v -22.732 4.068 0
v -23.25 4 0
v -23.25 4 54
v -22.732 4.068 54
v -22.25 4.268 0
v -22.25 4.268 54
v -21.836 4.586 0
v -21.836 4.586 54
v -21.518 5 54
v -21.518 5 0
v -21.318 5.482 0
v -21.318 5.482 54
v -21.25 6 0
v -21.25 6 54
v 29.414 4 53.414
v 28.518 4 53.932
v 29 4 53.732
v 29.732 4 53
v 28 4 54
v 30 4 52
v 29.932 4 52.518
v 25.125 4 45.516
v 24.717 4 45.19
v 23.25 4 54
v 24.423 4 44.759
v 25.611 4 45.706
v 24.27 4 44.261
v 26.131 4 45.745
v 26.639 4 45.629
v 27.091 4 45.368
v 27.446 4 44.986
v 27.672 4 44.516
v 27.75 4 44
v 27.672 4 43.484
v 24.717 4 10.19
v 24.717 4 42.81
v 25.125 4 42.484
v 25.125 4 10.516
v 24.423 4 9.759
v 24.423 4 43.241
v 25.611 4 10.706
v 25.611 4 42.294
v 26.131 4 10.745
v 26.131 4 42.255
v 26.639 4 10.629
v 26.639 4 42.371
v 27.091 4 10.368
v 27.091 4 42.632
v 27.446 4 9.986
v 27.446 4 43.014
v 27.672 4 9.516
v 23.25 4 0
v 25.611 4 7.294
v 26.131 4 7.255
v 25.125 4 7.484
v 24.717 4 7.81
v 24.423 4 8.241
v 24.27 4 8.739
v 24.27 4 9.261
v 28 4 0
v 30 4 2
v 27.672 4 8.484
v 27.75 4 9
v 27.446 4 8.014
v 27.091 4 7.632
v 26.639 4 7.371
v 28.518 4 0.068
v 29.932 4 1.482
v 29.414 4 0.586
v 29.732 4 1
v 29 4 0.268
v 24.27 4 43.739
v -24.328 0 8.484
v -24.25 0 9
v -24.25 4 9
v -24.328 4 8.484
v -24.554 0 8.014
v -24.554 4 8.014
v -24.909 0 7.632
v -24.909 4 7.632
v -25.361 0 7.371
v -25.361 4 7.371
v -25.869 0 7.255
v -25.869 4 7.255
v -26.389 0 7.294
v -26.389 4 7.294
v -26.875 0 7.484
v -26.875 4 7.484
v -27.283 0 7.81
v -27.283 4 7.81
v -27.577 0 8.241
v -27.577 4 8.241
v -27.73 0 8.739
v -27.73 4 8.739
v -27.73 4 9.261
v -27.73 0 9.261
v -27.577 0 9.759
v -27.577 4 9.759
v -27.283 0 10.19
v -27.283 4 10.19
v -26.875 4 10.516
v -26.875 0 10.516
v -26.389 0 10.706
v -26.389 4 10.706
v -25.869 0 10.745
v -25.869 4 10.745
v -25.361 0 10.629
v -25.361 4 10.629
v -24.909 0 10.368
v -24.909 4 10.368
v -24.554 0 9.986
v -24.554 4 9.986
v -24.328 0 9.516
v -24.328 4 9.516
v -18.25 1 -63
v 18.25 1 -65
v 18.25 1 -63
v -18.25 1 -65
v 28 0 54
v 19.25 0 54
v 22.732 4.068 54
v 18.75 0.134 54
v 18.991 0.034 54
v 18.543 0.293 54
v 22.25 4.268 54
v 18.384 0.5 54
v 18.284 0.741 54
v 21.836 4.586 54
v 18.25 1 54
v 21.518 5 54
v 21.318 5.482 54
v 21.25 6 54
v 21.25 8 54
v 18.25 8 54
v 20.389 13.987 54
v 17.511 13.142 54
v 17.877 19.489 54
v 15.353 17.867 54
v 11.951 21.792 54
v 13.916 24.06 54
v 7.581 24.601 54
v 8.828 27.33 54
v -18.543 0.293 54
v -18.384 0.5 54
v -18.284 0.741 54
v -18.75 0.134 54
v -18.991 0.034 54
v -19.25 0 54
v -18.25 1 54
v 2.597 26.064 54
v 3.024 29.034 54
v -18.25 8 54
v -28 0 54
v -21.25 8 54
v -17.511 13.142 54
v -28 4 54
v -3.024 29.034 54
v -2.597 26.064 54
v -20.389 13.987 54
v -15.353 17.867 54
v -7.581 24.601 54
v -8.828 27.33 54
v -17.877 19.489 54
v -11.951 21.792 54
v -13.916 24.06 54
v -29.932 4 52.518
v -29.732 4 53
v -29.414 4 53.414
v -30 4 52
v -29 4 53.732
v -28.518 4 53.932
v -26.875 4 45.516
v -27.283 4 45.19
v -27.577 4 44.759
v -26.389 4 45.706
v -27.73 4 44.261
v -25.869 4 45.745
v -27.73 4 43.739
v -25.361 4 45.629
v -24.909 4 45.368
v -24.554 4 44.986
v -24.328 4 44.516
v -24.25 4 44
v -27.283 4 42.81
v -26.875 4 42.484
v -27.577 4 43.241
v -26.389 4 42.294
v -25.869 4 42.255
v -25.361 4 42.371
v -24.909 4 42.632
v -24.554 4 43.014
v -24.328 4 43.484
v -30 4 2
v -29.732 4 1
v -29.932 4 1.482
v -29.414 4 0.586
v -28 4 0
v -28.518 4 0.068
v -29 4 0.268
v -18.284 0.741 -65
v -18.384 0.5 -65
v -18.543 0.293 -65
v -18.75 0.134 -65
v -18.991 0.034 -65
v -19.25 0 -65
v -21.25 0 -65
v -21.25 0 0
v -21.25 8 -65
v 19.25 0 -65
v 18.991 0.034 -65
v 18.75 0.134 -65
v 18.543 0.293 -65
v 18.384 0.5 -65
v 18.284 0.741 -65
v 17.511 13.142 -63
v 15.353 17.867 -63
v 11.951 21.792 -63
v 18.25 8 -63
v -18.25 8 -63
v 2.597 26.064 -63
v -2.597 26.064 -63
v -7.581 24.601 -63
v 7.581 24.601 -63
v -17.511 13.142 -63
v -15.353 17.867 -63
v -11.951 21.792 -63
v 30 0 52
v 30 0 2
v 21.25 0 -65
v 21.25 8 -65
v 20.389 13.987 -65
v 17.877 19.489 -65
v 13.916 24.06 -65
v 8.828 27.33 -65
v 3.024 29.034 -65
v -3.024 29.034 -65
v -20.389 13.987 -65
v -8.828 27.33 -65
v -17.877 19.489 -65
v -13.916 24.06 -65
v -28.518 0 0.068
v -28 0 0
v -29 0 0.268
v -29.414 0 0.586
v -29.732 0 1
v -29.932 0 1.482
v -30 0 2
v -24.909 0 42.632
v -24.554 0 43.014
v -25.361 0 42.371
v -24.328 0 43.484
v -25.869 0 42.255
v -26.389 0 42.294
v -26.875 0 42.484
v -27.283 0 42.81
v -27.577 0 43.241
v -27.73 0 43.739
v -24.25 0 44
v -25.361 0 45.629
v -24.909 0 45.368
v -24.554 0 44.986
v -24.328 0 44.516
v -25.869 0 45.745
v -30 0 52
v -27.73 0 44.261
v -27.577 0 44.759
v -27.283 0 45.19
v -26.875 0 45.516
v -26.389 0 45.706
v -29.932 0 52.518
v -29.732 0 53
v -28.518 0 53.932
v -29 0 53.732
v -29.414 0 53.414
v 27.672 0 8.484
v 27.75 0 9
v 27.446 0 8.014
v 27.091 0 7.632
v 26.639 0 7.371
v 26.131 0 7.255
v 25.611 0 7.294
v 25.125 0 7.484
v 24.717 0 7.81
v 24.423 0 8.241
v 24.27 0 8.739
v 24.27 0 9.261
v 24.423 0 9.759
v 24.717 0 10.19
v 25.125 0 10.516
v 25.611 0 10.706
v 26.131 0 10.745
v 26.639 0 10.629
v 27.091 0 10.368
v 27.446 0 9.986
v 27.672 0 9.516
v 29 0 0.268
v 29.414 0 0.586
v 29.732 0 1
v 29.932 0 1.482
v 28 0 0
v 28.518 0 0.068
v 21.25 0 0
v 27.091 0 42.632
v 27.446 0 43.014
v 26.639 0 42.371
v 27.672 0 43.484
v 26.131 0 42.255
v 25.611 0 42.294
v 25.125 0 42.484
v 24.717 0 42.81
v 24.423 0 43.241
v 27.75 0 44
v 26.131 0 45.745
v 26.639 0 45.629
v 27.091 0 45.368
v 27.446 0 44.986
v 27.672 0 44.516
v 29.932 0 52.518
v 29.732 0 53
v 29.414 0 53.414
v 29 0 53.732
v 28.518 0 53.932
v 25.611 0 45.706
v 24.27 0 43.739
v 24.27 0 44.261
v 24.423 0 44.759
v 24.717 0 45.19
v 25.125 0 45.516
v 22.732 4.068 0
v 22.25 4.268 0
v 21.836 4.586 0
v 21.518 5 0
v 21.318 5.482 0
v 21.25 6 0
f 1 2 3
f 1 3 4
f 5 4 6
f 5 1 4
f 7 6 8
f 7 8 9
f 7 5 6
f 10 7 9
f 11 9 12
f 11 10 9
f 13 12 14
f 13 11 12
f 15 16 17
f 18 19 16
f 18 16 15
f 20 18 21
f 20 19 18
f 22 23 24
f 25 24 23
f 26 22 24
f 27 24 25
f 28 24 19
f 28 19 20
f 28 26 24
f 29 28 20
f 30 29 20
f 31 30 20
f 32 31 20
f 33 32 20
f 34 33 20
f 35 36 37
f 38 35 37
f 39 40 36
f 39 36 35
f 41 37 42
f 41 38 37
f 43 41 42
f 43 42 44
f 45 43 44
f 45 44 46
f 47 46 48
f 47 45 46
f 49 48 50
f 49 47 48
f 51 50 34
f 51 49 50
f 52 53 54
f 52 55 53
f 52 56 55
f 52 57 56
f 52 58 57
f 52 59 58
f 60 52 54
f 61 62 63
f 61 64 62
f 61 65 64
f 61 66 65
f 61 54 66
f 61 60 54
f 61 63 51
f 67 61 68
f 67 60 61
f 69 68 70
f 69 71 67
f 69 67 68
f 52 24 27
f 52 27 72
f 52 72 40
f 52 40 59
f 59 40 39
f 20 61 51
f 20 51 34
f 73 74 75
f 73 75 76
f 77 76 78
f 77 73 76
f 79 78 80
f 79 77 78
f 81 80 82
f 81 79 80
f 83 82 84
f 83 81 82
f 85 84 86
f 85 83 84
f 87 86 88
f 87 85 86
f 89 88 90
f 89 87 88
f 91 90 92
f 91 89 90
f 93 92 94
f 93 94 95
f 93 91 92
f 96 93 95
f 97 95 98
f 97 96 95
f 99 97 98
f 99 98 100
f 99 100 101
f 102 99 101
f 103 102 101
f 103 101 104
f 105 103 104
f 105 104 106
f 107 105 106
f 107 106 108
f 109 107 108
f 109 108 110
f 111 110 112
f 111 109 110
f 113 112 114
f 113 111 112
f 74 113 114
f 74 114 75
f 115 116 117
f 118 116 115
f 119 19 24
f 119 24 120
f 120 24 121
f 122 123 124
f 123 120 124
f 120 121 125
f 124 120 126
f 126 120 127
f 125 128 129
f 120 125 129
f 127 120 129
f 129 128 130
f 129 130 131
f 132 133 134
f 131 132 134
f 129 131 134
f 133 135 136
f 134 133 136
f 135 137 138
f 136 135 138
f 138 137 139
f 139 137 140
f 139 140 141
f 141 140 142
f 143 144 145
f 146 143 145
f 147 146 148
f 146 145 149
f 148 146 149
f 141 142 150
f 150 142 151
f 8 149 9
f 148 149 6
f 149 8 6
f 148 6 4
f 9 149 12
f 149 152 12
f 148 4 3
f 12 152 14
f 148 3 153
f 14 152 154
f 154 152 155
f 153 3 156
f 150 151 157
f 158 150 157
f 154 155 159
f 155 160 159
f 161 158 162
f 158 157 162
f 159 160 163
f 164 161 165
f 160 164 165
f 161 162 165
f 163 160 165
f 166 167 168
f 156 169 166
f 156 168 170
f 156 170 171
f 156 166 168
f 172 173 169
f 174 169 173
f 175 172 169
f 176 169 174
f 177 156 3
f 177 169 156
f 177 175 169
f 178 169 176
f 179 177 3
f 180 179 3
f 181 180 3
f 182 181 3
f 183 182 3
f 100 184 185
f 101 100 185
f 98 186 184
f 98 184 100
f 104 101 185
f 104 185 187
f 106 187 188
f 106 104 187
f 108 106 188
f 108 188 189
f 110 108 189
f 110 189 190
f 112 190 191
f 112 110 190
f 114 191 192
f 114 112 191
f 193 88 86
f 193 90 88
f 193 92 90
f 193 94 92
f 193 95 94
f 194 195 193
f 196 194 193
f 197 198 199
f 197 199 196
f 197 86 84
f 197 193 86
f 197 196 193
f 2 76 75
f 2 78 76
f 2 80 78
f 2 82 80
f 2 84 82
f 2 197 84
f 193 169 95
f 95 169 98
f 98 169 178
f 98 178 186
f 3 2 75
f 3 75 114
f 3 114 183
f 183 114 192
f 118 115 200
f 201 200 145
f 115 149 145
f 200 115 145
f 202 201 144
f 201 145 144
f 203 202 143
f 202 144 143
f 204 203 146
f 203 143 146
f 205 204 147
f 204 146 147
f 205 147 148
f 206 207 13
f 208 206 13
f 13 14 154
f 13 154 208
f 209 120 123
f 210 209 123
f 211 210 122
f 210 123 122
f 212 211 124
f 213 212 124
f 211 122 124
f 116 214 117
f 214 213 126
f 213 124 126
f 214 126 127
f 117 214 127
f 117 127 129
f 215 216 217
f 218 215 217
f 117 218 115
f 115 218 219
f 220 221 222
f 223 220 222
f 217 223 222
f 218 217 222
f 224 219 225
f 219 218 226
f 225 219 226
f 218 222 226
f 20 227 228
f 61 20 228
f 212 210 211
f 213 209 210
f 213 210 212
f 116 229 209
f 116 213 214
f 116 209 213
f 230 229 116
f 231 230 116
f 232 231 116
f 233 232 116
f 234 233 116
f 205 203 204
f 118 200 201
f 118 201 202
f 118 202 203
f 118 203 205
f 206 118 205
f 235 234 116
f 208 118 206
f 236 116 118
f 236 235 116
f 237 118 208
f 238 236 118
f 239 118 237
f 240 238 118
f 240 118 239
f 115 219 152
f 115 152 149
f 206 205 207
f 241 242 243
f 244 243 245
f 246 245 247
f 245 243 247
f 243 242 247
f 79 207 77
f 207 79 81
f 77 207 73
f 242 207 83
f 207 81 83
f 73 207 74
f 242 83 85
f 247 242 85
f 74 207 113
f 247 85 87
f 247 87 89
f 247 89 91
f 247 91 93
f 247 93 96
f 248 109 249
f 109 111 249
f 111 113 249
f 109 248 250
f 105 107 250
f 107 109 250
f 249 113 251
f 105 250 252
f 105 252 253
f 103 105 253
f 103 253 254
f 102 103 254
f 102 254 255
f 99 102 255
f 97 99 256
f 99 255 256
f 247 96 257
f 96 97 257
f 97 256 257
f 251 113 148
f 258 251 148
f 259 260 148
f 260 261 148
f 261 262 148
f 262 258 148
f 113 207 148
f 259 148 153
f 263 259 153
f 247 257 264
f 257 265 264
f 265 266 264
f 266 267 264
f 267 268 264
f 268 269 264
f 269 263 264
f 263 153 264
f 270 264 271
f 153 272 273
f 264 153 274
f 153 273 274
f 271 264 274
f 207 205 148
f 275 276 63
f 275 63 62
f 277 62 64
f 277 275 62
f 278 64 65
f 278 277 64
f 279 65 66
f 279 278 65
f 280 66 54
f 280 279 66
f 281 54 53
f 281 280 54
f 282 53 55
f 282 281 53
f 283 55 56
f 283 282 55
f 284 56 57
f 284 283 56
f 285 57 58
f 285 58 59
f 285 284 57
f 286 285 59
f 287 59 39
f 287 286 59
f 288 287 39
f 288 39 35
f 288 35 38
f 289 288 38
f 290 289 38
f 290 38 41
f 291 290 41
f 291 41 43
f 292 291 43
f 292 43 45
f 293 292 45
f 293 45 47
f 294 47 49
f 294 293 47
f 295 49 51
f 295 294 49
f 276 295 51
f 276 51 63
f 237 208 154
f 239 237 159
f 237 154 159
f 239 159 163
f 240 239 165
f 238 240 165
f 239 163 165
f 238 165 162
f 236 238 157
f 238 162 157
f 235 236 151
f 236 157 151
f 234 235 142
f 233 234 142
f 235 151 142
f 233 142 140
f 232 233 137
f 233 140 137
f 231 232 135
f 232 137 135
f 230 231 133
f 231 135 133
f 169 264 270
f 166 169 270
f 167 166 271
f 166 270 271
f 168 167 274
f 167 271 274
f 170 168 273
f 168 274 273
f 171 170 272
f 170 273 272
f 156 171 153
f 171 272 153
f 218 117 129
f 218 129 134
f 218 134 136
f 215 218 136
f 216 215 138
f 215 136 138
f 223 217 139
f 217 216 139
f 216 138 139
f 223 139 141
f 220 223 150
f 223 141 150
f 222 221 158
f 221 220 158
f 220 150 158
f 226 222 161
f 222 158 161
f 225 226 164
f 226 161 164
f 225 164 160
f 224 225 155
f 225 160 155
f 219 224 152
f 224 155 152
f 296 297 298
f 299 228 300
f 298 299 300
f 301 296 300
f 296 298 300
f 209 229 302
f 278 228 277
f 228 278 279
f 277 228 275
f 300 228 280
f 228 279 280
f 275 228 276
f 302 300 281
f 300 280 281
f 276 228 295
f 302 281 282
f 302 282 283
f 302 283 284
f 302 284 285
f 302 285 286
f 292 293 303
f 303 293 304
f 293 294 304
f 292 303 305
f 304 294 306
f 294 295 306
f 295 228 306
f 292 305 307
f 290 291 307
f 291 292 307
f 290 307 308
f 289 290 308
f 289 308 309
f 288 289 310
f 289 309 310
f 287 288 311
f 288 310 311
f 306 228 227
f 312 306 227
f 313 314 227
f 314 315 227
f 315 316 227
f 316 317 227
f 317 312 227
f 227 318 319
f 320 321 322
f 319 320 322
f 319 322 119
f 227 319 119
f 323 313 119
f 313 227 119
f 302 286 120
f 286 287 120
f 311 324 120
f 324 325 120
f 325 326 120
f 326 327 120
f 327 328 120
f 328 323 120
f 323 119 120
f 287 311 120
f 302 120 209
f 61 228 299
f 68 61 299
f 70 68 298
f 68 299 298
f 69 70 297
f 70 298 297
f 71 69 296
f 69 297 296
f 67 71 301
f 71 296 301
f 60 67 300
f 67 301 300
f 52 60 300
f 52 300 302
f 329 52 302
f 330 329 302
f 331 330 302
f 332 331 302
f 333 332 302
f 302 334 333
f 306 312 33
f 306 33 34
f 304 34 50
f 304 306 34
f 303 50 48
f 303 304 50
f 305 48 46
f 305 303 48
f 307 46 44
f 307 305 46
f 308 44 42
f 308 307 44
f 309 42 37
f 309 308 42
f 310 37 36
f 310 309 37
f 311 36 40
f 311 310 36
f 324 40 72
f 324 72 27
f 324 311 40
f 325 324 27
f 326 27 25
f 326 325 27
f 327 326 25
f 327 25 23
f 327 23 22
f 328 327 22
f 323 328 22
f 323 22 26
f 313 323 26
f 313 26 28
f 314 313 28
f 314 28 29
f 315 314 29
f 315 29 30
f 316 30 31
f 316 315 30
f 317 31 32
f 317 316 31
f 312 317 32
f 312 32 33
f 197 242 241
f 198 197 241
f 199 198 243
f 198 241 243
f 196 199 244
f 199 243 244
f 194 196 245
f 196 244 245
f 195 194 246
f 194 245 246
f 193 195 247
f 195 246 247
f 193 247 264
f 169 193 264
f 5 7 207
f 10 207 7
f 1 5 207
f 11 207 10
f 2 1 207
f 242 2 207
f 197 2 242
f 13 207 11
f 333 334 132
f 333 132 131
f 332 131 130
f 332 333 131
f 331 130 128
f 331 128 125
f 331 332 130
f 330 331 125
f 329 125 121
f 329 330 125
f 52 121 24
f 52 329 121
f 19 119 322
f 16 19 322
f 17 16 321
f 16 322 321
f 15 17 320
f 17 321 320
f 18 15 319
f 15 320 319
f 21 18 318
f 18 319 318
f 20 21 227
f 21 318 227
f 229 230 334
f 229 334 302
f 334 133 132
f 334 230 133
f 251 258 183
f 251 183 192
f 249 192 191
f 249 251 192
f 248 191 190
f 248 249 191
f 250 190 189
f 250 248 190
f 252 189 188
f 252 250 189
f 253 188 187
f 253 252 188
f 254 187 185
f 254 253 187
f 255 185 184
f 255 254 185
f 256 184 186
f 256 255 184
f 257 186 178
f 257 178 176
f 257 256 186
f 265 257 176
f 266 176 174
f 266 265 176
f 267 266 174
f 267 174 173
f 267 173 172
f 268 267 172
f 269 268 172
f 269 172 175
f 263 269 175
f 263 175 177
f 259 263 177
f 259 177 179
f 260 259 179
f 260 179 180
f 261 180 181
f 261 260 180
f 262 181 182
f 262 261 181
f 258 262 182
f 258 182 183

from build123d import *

# Parameters (mm, degrees)
EXTRUDE_5_DEPTH     = 54
SKETCH_10_OUTSIDE_W = 79.172
SKETCH_10_OUTSIDE_H = 73.172
SKETCH_10_OUTSIDE_R = 1.75
CUT_EXTRUDE_1_DEPTH = 4
FILLET_1_R          = 1
EXTRUDE_6_DEPTH     = 65
EXTRUDE_7_DEPTH     = 2


with BuildPart() as part:
    # 草图11 → 凸台-拉伸5 (new body)
    with BuildSketch(Plane.XY):
        with BuildLine():
            Line((-30, 0), (-30, 4))
            Line((-30, 4), (-23.25, 4))
            ThreePointArc((-23.25, 4), (-21.835786438, 4.585786438), (-21.25, 6))
            Line((-21.25, 6), (-21.25, 8))
            ThreePointArc((-21.25, 8), (0, 29.25), (21.25, 8))
            Line((21.25, 8), (21.25, 6))
            ThreePointArc((21.25, 6), (21.835786438, 4.585786438), (23.25, 4))
            Line((23.25, 4), (30, 4))
            Line((30, 4), (30, 0))
            Line((30, 0), (18.25, 0))
            Line((18.25, 0), (18.25, 8))
            ThreePointArc((18.25, 8), (0, 26.25), (-18.25, 8))
            Line((-18.25, 8), (-18.25, 0))
            Line((-18.25, 0), (-30, 0))
        make_face()
    extrude(amount=EXTRUDE_5_DEPTH)

    # 草图10 outside → 切除-拉伸1 (cut)
    with BuildSketch(Plane(origin=(0, 0, 0), x_dir=(1, 0, 0), z_dir=(0, 1, 0))):
        with Locations((0, -27)):
            Rectangle(SKETCH_10_OUTSIDE_W, SKETCH_10_OUTSIDE_H)
        with BuildLine():
            Line((-30, -2), (-30, -52))
            ThreePointArc((-30, -52), (-29.414213562, -53.414213562), (-28, -54))
            Line((-28, -54), (28, -54))
            ThreePointArc((28, -54), (29.414213562, -53.414213562), (30, -52))
            Line((30, -52), (30, -2))
            ThreePointArc((30, -2), (29.414213562, -0.585786438), (28, 0))
            Line((28, 0), (-28, 0))
            ThreePointArc((-28, 0), (-29.414213562, -0.585786438), (-30, -2))
        make_face(mode=Mode.SUBTRACT)
        with Locations((-26, -9)):
            Circle(SKETCH_10_OUTSIDE_R)
        with Locations((26, -9)):
            Circle(SKETCH_10_OUTSIDE_R)
        with Locations((26, -44)):
            Circle(SKETCH_10_OUTSIDE_R)
        with Locations((-26, -44)):
            Circle(SKETCH_10_OUTSIDE_R)
    extrude(amount=CUT_EXTRUDE_1_DEPTH, mode=Mode.SUBTRACT)

    # 圆角1
    fillet_1_edges = [part.edges().sort_by_distance(p)[0] for p in [
        (18.25, 0, 27),
        (-18.25, 0, 27),
    ]]
    fillet(fillet_1_edges, radius=FILLET_1_R)

    # 草图12 → 凸台-拉伸6 (add)
    with BuildSketch(Plane(origin=(0, 0, 0), x_dir=(-1, 0, 0), z_dir=(0, 0, -1))):
        with BuildLine():
            ThreePointArc((-18.25, 8), (0, 26.25), (18.25, 8))
            Line((18.25, 8), (18.25, 6))
            Line((18.25, 6), (18.25, 1))
            ThreePointArc((18.25, 1), (18.542893219, 0.292893219), (19.25, 0))
            Line((19.25, 0), (21.25, 0))
            Line((21.25, 0), (21.25, 6))
            Line((21.25, 6), (21.25, 8))
            ThreePointArc((21.25, 8), (0, 29.25), (-21.25, 8))
            Line((-21.25, 8), (-21.25, 6))
            Line((-21.25, 6), (-21.25, 0))
            Line((-21.25, 0), (-19.25, 0))
            ThreePointArc((-19.25, 0), (-18.542893219, 0.292893219), (-18.25, 1))
            Line((-18.25, 1), (-18.25, 6))
            Line((-18.25, 6), (-18.25, 8))
        make_face()
    extrude(amount=EXTRUDE_6_DEPTH)

    # 草图13 → 凸台-拉伸7 (add)
    with BuildSketch(Plane(origin=(0, 0, -65), x_dir=(-1, 0, 0), z_dir=(0, 0, -1))):
        with BuildLine():
            Line((-18.25, 1), (18.25, 1))
            Line((18.25, 1), (18.25, 8))
            ThreePointArc((18.25, 8), (0, 26.25), (-18.25, 8))
            Line((-18.25, 8), (-18.25, 1))
        make_face()
    extrude(amount=-EXTRUDE_7_DEPTH)


solid = part.part
